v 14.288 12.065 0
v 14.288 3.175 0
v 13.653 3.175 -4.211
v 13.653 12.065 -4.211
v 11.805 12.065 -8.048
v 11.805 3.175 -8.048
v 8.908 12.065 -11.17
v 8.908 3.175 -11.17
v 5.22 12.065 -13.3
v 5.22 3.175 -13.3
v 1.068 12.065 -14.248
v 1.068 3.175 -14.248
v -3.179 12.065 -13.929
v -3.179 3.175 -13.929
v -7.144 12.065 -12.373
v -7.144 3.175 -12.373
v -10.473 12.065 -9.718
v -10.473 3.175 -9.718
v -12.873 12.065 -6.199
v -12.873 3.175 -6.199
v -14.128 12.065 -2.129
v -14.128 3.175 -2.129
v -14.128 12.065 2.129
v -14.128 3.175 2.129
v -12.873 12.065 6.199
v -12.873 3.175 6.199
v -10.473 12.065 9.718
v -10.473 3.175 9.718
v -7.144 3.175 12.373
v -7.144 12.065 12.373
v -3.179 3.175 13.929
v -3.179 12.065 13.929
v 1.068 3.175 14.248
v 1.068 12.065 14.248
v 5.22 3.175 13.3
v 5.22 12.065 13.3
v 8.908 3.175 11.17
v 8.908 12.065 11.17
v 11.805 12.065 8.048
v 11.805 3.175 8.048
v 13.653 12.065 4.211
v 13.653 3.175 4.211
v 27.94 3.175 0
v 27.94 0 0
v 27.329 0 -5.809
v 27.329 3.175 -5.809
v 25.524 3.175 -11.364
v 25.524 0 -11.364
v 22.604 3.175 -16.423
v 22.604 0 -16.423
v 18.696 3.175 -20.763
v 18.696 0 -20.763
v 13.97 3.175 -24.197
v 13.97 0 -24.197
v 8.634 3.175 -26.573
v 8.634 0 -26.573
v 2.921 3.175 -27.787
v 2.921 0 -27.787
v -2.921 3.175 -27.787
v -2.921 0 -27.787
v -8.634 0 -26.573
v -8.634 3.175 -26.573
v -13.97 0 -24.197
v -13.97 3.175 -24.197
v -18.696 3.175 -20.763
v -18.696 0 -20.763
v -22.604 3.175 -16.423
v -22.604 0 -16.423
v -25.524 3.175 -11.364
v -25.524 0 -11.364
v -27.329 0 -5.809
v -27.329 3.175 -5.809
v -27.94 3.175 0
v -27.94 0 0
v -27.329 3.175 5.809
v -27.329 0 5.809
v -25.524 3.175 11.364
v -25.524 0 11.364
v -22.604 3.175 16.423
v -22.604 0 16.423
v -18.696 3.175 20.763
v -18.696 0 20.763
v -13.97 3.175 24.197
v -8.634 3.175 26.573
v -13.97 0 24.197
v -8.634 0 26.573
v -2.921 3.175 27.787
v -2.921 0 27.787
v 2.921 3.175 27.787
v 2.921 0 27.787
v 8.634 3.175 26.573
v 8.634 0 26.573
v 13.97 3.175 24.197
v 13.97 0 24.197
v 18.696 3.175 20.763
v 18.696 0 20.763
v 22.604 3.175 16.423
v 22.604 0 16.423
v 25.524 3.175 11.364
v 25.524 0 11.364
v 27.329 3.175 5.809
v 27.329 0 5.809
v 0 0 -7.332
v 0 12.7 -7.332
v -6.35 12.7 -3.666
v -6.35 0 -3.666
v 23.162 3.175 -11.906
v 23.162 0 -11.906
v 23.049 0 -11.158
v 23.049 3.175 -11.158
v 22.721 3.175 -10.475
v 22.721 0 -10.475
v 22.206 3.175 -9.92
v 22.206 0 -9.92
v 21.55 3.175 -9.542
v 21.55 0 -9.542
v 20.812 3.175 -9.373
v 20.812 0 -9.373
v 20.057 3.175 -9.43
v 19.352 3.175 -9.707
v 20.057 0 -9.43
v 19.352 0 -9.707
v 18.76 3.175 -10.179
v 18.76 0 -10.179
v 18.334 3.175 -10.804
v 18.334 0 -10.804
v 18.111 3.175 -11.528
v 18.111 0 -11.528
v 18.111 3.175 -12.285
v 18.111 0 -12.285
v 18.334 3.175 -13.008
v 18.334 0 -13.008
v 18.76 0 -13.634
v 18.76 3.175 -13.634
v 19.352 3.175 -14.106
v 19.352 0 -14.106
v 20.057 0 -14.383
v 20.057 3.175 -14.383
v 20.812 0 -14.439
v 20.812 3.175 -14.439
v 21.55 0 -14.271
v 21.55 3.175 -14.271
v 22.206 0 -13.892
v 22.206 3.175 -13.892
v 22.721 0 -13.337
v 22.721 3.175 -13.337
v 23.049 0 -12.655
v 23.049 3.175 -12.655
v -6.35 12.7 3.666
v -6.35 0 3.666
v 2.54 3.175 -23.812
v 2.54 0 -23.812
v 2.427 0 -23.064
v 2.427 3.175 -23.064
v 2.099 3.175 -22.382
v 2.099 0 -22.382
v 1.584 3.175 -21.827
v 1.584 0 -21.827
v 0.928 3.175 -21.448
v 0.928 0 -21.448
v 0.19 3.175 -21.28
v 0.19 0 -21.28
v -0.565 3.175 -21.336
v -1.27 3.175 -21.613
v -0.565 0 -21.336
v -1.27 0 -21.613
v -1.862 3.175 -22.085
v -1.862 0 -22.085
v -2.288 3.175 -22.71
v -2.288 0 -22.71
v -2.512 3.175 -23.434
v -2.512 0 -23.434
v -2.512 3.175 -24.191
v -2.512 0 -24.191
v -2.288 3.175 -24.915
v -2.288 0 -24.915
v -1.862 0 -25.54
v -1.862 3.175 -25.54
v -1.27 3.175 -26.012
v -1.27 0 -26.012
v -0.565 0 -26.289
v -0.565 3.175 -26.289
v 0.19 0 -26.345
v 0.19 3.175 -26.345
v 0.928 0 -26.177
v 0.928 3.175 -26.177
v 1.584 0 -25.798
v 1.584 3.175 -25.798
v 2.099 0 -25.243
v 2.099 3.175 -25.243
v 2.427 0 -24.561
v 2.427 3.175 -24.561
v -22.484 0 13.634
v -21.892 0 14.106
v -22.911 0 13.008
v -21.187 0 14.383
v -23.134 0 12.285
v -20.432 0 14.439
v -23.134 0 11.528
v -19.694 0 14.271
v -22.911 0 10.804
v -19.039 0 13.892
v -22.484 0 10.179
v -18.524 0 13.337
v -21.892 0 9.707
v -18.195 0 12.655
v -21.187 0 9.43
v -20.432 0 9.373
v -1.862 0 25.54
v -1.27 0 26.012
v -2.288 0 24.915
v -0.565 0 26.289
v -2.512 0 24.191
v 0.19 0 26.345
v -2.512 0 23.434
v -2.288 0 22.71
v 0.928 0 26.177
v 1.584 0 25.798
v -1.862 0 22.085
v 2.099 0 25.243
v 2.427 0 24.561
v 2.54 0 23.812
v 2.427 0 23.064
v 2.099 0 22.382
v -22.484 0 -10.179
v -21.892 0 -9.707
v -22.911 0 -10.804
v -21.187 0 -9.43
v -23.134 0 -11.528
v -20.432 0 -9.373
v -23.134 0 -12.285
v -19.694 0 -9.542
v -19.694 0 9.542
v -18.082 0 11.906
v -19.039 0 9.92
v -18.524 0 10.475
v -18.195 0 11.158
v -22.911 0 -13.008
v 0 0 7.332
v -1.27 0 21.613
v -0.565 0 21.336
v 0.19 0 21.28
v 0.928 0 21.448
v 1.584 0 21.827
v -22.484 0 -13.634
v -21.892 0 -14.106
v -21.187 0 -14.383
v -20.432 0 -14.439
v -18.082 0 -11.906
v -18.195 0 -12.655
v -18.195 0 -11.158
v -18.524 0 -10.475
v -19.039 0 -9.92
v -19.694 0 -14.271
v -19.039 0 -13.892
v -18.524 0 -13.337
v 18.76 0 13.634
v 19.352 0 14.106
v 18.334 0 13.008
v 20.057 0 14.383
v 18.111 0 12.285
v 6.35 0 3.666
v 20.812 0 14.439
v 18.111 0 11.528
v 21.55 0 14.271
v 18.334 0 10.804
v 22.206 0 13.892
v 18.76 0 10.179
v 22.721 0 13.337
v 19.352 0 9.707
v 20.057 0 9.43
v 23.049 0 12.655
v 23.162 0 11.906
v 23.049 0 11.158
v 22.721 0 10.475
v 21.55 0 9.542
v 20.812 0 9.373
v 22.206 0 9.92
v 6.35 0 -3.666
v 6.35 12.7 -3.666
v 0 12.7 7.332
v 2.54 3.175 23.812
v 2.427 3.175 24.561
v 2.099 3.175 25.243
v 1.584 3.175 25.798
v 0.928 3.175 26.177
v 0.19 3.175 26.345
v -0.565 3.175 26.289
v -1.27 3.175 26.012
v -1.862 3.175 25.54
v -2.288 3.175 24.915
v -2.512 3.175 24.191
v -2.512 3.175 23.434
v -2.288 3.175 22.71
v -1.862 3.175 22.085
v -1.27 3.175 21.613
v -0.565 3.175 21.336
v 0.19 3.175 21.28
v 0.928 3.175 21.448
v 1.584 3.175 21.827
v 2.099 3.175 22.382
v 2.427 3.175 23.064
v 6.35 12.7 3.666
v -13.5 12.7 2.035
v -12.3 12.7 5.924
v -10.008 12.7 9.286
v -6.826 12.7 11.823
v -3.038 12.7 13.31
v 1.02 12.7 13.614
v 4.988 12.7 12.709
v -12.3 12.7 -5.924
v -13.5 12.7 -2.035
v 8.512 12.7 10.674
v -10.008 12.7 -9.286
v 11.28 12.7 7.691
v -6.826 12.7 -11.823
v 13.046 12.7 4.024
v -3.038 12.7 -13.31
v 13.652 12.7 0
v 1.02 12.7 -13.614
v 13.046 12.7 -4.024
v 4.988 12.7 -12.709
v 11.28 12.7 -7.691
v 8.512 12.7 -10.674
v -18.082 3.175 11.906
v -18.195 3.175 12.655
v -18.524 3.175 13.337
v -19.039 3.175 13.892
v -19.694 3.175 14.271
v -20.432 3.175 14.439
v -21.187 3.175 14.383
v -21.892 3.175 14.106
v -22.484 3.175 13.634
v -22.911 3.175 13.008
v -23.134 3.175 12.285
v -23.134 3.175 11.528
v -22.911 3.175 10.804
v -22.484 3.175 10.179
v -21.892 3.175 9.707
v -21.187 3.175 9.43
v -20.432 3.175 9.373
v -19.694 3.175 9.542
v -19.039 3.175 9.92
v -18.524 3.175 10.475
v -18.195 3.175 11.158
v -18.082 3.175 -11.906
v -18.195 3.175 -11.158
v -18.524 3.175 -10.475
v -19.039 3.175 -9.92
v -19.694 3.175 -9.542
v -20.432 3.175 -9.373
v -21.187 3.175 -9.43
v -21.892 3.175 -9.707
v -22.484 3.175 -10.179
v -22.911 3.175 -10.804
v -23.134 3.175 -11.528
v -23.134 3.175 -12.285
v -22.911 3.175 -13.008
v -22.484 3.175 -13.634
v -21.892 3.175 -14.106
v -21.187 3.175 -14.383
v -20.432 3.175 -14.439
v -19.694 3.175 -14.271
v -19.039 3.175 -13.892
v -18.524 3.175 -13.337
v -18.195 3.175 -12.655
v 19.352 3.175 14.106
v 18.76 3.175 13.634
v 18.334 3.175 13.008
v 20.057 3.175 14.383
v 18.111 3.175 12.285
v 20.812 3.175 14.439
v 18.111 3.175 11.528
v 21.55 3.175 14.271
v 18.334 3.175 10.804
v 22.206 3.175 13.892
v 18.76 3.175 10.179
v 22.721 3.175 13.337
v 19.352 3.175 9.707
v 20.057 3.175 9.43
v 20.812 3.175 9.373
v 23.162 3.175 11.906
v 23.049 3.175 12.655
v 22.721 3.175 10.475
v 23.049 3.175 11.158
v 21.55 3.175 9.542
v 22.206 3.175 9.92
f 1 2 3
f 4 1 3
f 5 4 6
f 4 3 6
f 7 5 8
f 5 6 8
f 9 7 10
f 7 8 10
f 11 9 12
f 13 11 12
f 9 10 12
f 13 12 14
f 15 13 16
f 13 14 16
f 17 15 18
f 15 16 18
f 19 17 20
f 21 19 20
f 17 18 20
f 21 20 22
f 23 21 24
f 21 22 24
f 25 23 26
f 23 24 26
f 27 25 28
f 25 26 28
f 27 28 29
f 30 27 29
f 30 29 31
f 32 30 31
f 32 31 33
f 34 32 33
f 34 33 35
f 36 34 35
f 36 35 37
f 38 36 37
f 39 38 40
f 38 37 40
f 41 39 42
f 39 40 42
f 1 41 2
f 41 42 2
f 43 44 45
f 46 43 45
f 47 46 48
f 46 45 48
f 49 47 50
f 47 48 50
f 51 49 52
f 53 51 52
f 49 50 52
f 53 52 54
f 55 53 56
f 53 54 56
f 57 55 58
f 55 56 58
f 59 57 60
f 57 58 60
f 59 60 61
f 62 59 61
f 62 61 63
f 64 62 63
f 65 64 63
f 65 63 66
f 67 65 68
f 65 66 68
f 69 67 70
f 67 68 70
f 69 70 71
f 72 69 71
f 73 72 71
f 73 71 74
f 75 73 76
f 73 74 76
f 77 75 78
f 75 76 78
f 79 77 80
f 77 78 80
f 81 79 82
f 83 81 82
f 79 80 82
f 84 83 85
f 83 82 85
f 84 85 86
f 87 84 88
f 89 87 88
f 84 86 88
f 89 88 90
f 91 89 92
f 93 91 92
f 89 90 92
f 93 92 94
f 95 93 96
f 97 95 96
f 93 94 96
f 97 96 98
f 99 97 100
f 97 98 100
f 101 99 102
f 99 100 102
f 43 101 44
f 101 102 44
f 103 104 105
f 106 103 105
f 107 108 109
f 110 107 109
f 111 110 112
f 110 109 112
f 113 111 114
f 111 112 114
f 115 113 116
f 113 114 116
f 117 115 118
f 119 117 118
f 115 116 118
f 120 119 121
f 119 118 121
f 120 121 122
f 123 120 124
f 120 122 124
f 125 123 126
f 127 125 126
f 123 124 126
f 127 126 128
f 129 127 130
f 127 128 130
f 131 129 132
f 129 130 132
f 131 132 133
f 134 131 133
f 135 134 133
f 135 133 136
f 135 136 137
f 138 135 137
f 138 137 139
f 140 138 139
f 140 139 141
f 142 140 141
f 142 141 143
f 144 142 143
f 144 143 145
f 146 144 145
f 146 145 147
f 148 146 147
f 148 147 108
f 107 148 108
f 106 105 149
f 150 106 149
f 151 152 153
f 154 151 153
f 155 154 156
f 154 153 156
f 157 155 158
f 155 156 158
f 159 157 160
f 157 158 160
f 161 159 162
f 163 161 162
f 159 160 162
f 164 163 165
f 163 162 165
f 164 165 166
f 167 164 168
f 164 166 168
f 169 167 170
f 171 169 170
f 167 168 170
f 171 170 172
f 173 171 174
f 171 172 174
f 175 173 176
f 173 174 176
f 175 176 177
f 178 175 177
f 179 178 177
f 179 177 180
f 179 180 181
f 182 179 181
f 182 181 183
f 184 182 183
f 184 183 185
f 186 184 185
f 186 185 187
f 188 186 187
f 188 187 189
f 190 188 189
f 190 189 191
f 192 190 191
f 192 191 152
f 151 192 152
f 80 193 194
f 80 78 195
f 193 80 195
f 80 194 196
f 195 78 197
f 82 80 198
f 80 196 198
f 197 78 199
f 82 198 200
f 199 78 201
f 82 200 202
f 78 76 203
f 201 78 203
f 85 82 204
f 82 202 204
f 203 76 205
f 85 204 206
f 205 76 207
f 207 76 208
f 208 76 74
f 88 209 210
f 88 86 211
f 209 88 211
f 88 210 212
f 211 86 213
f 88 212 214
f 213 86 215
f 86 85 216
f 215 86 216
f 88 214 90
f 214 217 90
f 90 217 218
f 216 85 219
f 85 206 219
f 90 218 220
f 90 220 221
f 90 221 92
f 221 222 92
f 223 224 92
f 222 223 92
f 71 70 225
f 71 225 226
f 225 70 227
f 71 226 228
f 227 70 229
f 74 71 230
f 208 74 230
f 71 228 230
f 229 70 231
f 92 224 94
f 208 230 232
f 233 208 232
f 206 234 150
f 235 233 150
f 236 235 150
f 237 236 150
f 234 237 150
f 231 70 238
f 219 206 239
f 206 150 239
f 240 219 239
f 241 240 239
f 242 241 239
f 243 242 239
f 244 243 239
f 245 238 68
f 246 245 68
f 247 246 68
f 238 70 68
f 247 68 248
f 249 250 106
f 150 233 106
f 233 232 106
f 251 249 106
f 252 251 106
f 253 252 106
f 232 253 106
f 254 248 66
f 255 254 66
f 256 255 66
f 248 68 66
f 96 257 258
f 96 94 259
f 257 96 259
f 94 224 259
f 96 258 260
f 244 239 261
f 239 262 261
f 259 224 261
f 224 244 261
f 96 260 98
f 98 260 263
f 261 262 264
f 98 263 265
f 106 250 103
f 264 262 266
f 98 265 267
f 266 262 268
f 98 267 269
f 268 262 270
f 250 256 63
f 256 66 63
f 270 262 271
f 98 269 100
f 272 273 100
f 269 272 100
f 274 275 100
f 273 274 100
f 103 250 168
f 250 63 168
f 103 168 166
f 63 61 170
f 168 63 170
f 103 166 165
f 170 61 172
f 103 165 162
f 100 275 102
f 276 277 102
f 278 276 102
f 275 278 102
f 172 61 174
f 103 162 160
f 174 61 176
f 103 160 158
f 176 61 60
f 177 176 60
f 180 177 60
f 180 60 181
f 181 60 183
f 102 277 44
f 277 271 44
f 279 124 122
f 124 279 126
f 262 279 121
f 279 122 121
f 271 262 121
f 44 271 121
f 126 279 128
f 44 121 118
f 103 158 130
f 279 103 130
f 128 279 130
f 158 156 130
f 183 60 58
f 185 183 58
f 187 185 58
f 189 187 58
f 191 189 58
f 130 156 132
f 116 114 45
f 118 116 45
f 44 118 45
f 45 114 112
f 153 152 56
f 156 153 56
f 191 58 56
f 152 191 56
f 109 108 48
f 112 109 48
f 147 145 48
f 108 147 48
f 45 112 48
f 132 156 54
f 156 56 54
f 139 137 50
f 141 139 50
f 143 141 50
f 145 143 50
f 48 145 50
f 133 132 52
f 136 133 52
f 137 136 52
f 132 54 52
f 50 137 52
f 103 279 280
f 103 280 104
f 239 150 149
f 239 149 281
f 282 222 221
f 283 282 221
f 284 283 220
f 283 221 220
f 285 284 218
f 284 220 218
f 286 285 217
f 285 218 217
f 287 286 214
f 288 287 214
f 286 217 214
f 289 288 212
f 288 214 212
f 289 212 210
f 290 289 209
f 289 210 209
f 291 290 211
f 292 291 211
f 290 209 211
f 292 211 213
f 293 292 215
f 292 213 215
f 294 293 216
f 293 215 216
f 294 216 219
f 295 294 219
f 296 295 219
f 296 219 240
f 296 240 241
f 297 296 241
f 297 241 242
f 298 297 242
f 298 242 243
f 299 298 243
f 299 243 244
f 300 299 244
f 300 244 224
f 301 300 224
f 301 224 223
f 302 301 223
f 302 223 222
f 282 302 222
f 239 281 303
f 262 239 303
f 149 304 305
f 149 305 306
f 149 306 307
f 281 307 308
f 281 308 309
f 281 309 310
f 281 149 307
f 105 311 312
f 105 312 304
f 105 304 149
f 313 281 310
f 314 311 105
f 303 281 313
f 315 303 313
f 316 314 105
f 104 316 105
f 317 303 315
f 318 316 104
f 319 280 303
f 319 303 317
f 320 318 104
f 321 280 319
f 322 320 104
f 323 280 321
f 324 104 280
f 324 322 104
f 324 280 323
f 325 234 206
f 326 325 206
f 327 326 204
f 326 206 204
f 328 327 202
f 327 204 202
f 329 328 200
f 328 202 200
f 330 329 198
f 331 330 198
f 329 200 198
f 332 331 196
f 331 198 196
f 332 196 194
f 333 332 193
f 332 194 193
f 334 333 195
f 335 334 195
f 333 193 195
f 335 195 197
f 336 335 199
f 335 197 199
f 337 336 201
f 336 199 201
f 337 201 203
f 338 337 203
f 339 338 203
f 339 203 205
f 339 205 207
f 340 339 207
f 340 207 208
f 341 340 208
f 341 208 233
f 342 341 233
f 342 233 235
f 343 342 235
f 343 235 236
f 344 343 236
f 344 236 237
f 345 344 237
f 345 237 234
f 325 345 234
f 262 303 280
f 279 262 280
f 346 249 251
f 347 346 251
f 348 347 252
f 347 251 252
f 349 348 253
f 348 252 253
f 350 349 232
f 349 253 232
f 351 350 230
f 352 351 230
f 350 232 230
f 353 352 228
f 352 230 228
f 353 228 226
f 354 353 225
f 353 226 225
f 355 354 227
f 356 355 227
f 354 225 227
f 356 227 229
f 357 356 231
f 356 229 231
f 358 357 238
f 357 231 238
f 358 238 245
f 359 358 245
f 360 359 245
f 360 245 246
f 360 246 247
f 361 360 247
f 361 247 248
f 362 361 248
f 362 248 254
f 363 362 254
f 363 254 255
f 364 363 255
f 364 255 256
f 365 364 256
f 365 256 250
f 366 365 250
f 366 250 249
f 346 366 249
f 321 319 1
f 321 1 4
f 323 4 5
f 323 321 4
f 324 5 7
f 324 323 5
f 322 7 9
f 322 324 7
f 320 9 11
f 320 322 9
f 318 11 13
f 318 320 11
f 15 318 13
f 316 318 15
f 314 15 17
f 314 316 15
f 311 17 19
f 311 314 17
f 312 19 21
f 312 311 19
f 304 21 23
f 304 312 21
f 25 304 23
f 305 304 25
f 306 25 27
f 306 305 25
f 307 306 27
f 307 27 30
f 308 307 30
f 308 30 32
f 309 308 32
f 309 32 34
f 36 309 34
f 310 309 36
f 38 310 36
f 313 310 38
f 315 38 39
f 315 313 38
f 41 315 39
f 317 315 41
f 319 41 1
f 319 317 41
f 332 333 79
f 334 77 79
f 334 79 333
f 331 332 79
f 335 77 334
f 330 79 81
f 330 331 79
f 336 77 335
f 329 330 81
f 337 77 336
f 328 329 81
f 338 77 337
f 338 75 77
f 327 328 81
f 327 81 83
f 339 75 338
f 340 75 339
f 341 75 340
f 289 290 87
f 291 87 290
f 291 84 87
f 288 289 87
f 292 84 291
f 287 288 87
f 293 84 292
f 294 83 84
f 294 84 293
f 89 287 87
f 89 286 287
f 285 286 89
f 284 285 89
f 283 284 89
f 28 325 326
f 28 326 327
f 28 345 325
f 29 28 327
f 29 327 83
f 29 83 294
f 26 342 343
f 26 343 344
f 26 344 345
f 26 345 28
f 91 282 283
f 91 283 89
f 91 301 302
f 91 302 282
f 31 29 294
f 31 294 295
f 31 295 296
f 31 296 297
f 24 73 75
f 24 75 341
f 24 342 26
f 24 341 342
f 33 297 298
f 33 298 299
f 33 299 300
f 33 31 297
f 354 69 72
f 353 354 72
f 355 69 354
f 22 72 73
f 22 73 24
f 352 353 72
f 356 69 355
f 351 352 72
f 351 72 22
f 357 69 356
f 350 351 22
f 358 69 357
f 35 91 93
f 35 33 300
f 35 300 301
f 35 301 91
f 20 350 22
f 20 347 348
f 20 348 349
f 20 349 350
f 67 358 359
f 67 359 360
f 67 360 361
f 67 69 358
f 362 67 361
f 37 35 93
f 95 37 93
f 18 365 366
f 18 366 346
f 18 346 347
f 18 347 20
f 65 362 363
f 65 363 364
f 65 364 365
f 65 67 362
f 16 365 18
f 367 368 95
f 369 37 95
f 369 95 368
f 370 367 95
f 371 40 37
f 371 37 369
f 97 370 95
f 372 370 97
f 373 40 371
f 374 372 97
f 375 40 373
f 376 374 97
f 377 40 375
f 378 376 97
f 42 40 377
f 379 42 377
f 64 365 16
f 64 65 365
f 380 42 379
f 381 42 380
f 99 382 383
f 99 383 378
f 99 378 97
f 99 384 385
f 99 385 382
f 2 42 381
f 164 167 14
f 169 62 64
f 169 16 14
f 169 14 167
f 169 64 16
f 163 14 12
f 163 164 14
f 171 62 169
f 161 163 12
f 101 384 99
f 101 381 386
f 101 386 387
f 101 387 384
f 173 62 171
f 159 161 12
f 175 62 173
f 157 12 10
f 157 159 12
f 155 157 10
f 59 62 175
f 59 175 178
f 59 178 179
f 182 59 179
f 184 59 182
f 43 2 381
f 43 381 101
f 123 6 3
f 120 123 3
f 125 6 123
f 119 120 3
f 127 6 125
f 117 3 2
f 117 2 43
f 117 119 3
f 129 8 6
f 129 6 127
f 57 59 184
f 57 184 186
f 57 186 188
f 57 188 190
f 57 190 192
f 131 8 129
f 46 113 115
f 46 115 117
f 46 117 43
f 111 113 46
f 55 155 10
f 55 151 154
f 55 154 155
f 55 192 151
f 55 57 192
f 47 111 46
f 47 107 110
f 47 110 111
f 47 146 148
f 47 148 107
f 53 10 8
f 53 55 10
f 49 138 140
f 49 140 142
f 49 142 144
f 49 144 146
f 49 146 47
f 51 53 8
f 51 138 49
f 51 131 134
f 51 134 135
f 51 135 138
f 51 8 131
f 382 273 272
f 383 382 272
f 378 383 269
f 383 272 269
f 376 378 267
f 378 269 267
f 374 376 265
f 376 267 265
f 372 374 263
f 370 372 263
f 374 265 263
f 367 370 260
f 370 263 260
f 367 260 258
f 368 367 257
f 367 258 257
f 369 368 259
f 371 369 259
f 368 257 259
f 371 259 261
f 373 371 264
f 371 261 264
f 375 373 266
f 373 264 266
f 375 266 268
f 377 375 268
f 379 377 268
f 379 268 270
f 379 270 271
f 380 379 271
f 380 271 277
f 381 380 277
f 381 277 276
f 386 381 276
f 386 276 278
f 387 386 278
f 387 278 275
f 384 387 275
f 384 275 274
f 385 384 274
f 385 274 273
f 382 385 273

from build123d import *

# Parameters (mm, degrees)
SKETCH1_R               = 27.94
BOSS_EXTRUDE1_DEPTH     = 3.175
SKETCH2_R               = 14.2875
BOSS_EXTRUDE2_DEPTH     = 9.525
CHAMFER1_SIZE           = 0.635
CUT_EXTRUDE2_DEPTH      = 1
CUT_EXTRUDE2_DEPTH_BACK = 13.7
SKETCH4_R               = 2.54
CUT_EXTRUDE3_DEPTH      = 13.7


with BuildPart() as part:
    # Sketch1 → Boss-Extrude1 (new body)
    with BuildSketch(Plane(origin=(0, 0, 0), x_dir=(1, 0, 0), z_dir=(0, 1, 0))):
        Circle(SKETCH1_R)
    extrude(amount=BOSS_EXTRUDE1_DEPTH)

    # Sketch2 → Boss-Extrude2 (add)
    with BuildSketch(Plane(origin=(0, 3.175, 0), x_dir=(1, 0, 0), z_dir=(0, 1, 0))):
        Circle(SKETCH2_R)
    extrude(amount=BOSS_EXTRUDE2_DEPTH)

    # Chamfer1
    chamfer1_edges = [part.edges().sort_by_distance(p)[0] for p in [
        (-14.2875, 12.7, 0),
    ]]
    chamfer(chamfer1_edges, length=CHAMFER1_SIZE)

    # Sketch3 → Cut-Extrude2 (cut, two sides)
    with BuildSketch(Plane(origin=(0, 12.7, 0), x_dir=(1, 0, 0), z_dir=(0, 1, 0))) as cut_extrude2_sk:
        Polygon((6.35, 3.666174209), (0, 7.332348419), (-6.35, 3.666174209), (-6.35, -3.666174209), (0, -7.332348419), (6.35, -3.666174209), align=None)
    extrude(amount=CUT_EXTRUDE2_DEPTH, mode=Mode.SUBTRACT)
    extrude(cut_extrude2_sk.sketch, amount=-CUT_EXTRUDE2_DEPTH_BACK, mode=Mode.SUBTRACT)

    # Sketch4 → Cut-Extrude3 (cut, through all)
    with BuildSketch(Plane.XZ):
        with Locations((0, 23.8125)):
            Circle(SKETCH4_R)
        with Locations((20.622229928, 11.90625)):
            Circle(SKETCH4_R)
        with Locations((20.622229928, -11.90625)):
            Circle(SKETCH4_R)
        with Locations((0, -23.8125)):
            Circle(SKETCH4_R)
        with Locations((-20.622229928, -11.90625)):
            Circle(SKETCH4_R)
        with Locations((-20.622229928, 11.90625)):
            Circle(SKETCH4_R)
    extrude(amount=-CUT_EXTRUDE3_DEPTH, mode=Mode.SUBTRACT)


solid = part.part
